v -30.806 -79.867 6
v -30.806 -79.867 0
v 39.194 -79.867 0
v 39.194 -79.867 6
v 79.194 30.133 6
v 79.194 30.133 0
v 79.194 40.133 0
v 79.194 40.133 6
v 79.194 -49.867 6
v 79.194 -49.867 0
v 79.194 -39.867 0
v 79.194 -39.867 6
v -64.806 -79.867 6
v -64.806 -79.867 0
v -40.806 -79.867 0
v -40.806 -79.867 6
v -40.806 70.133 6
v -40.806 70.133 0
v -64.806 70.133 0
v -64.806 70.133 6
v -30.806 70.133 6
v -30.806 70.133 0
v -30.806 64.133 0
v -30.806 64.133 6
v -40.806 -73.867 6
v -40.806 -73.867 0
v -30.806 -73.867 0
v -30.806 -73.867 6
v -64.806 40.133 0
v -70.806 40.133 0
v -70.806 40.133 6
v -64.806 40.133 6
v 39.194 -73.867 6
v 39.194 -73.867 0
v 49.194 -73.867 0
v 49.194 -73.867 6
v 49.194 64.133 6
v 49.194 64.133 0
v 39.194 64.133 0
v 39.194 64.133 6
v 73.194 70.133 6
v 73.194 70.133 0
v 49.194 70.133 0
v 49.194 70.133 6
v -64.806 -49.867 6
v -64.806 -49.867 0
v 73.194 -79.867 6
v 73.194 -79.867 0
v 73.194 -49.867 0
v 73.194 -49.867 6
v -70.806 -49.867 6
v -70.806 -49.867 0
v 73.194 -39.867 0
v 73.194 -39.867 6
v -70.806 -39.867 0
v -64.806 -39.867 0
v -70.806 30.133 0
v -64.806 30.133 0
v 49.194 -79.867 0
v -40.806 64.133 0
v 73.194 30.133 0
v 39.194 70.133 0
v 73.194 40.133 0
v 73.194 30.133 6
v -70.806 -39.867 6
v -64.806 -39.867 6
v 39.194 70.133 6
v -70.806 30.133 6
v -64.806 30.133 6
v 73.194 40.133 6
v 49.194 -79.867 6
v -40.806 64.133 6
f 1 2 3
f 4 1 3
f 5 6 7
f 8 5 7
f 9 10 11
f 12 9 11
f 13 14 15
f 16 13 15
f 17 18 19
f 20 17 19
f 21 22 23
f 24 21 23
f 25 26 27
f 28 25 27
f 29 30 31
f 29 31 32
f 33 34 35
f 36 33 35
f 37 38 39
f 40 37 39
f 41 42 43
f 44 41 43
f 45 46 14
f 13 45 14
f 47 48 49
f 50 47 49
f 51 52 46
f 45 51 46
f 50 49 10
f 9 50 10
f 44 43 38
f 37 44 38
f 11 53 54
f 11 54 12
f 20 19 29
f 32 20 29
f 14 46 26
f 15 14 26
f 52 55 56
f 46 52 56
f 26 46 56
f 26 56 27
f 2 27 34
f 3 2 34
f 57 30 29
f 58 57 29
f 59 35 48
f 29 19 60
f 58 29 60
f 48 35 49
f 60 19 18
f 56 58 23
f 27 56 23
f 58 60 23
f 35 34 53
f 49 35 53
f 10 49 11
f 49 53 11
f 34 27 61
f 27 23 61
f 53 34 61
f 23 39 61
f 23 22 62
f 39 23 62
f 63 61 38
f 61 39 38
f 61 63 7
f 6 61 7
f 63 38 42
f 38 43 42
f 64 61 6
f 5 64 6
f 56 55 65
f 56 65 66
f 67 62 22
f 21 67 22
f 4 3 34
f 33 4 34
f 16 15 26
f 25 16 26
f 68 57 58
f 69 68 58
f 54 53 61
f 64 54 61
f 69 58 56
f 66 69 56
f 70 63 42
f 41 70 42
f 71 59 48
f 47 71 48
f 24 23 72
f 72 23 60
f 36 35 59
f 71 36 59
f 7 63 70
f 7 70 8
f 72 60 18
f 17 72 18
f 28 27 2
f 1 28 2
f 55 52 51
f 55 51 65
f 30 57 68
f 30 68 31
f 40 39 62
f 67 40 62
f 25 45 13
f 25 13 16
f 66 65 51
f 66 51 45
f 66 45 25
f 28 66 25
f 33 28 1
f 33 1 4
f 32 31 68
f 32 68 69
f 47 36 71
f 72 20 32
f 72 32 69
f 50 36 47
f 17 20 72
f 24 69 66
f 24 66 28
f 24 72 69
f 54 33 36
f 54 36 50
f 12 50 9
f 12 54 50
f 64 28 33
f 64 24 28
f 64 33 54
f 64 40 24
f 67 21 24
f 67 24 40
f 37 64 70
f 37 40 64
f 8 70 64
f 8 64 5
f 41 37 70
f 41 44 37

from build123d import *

# Parameters (mm, degrees)
F0_W     = 6
F0_H     = 10
F1_DEPTH = 6


with BuildPart() as f1:
    # F0 (on Top) → F1 (new body)
    with BuildSketch(Plane.XY):
        Polygon((49.193878, -79.867347), (73.193878, -79.867347), (73.193878, -73.867347), (73.193878, -49.867347), (73.193878, -39.867347), (73.193878, 30.132653), (73.193878, 40.132653), (73.193878, 64.132653), (73.193878, 70.132653), (49.193878, 70.132653), (49.193878, 64.132653), (39.193878, 64.132653), (39.193878, 70.132653), (-30.806122, 70.132653), (-30.806122, 64.132653), (-40.806122, 64.132653), (-40.806122, 70.132653), (-64.806122, 70.132653), (-64.806122, 64.132653), (-64.806122, 40.132653), (-64.806122, 30.132653), (-64.806122, -39.867347), (-64.806122, -49.867347), (-64.806122, -73.867347), (-64.806122, -79.867347), (-40.806122, -79.867347), (-40.806122, -73.867347), (-30.806122, -73.867347), (-30.806122, -79.867347), (39.193878, -79.867347), (39.193878, -73.867347), (49.193878, -73.867347), align=None)
        with Locations((-67.806122, 35.132653)):
            Rectangle(F0_W, F0_H)
        with Locations((-67.806122, -44.867347)):
            Rectangle(F0_W, F0_H)
        with Locations((76.193878, -44.867347)):
            Rectangle(F0_W, F0_H)
        with Locations((76.193878, 35.132653)):
            Rectangle(F0_W, F0_H)
    extrude(amount=F1_DEPTH)


solid = f1.part
